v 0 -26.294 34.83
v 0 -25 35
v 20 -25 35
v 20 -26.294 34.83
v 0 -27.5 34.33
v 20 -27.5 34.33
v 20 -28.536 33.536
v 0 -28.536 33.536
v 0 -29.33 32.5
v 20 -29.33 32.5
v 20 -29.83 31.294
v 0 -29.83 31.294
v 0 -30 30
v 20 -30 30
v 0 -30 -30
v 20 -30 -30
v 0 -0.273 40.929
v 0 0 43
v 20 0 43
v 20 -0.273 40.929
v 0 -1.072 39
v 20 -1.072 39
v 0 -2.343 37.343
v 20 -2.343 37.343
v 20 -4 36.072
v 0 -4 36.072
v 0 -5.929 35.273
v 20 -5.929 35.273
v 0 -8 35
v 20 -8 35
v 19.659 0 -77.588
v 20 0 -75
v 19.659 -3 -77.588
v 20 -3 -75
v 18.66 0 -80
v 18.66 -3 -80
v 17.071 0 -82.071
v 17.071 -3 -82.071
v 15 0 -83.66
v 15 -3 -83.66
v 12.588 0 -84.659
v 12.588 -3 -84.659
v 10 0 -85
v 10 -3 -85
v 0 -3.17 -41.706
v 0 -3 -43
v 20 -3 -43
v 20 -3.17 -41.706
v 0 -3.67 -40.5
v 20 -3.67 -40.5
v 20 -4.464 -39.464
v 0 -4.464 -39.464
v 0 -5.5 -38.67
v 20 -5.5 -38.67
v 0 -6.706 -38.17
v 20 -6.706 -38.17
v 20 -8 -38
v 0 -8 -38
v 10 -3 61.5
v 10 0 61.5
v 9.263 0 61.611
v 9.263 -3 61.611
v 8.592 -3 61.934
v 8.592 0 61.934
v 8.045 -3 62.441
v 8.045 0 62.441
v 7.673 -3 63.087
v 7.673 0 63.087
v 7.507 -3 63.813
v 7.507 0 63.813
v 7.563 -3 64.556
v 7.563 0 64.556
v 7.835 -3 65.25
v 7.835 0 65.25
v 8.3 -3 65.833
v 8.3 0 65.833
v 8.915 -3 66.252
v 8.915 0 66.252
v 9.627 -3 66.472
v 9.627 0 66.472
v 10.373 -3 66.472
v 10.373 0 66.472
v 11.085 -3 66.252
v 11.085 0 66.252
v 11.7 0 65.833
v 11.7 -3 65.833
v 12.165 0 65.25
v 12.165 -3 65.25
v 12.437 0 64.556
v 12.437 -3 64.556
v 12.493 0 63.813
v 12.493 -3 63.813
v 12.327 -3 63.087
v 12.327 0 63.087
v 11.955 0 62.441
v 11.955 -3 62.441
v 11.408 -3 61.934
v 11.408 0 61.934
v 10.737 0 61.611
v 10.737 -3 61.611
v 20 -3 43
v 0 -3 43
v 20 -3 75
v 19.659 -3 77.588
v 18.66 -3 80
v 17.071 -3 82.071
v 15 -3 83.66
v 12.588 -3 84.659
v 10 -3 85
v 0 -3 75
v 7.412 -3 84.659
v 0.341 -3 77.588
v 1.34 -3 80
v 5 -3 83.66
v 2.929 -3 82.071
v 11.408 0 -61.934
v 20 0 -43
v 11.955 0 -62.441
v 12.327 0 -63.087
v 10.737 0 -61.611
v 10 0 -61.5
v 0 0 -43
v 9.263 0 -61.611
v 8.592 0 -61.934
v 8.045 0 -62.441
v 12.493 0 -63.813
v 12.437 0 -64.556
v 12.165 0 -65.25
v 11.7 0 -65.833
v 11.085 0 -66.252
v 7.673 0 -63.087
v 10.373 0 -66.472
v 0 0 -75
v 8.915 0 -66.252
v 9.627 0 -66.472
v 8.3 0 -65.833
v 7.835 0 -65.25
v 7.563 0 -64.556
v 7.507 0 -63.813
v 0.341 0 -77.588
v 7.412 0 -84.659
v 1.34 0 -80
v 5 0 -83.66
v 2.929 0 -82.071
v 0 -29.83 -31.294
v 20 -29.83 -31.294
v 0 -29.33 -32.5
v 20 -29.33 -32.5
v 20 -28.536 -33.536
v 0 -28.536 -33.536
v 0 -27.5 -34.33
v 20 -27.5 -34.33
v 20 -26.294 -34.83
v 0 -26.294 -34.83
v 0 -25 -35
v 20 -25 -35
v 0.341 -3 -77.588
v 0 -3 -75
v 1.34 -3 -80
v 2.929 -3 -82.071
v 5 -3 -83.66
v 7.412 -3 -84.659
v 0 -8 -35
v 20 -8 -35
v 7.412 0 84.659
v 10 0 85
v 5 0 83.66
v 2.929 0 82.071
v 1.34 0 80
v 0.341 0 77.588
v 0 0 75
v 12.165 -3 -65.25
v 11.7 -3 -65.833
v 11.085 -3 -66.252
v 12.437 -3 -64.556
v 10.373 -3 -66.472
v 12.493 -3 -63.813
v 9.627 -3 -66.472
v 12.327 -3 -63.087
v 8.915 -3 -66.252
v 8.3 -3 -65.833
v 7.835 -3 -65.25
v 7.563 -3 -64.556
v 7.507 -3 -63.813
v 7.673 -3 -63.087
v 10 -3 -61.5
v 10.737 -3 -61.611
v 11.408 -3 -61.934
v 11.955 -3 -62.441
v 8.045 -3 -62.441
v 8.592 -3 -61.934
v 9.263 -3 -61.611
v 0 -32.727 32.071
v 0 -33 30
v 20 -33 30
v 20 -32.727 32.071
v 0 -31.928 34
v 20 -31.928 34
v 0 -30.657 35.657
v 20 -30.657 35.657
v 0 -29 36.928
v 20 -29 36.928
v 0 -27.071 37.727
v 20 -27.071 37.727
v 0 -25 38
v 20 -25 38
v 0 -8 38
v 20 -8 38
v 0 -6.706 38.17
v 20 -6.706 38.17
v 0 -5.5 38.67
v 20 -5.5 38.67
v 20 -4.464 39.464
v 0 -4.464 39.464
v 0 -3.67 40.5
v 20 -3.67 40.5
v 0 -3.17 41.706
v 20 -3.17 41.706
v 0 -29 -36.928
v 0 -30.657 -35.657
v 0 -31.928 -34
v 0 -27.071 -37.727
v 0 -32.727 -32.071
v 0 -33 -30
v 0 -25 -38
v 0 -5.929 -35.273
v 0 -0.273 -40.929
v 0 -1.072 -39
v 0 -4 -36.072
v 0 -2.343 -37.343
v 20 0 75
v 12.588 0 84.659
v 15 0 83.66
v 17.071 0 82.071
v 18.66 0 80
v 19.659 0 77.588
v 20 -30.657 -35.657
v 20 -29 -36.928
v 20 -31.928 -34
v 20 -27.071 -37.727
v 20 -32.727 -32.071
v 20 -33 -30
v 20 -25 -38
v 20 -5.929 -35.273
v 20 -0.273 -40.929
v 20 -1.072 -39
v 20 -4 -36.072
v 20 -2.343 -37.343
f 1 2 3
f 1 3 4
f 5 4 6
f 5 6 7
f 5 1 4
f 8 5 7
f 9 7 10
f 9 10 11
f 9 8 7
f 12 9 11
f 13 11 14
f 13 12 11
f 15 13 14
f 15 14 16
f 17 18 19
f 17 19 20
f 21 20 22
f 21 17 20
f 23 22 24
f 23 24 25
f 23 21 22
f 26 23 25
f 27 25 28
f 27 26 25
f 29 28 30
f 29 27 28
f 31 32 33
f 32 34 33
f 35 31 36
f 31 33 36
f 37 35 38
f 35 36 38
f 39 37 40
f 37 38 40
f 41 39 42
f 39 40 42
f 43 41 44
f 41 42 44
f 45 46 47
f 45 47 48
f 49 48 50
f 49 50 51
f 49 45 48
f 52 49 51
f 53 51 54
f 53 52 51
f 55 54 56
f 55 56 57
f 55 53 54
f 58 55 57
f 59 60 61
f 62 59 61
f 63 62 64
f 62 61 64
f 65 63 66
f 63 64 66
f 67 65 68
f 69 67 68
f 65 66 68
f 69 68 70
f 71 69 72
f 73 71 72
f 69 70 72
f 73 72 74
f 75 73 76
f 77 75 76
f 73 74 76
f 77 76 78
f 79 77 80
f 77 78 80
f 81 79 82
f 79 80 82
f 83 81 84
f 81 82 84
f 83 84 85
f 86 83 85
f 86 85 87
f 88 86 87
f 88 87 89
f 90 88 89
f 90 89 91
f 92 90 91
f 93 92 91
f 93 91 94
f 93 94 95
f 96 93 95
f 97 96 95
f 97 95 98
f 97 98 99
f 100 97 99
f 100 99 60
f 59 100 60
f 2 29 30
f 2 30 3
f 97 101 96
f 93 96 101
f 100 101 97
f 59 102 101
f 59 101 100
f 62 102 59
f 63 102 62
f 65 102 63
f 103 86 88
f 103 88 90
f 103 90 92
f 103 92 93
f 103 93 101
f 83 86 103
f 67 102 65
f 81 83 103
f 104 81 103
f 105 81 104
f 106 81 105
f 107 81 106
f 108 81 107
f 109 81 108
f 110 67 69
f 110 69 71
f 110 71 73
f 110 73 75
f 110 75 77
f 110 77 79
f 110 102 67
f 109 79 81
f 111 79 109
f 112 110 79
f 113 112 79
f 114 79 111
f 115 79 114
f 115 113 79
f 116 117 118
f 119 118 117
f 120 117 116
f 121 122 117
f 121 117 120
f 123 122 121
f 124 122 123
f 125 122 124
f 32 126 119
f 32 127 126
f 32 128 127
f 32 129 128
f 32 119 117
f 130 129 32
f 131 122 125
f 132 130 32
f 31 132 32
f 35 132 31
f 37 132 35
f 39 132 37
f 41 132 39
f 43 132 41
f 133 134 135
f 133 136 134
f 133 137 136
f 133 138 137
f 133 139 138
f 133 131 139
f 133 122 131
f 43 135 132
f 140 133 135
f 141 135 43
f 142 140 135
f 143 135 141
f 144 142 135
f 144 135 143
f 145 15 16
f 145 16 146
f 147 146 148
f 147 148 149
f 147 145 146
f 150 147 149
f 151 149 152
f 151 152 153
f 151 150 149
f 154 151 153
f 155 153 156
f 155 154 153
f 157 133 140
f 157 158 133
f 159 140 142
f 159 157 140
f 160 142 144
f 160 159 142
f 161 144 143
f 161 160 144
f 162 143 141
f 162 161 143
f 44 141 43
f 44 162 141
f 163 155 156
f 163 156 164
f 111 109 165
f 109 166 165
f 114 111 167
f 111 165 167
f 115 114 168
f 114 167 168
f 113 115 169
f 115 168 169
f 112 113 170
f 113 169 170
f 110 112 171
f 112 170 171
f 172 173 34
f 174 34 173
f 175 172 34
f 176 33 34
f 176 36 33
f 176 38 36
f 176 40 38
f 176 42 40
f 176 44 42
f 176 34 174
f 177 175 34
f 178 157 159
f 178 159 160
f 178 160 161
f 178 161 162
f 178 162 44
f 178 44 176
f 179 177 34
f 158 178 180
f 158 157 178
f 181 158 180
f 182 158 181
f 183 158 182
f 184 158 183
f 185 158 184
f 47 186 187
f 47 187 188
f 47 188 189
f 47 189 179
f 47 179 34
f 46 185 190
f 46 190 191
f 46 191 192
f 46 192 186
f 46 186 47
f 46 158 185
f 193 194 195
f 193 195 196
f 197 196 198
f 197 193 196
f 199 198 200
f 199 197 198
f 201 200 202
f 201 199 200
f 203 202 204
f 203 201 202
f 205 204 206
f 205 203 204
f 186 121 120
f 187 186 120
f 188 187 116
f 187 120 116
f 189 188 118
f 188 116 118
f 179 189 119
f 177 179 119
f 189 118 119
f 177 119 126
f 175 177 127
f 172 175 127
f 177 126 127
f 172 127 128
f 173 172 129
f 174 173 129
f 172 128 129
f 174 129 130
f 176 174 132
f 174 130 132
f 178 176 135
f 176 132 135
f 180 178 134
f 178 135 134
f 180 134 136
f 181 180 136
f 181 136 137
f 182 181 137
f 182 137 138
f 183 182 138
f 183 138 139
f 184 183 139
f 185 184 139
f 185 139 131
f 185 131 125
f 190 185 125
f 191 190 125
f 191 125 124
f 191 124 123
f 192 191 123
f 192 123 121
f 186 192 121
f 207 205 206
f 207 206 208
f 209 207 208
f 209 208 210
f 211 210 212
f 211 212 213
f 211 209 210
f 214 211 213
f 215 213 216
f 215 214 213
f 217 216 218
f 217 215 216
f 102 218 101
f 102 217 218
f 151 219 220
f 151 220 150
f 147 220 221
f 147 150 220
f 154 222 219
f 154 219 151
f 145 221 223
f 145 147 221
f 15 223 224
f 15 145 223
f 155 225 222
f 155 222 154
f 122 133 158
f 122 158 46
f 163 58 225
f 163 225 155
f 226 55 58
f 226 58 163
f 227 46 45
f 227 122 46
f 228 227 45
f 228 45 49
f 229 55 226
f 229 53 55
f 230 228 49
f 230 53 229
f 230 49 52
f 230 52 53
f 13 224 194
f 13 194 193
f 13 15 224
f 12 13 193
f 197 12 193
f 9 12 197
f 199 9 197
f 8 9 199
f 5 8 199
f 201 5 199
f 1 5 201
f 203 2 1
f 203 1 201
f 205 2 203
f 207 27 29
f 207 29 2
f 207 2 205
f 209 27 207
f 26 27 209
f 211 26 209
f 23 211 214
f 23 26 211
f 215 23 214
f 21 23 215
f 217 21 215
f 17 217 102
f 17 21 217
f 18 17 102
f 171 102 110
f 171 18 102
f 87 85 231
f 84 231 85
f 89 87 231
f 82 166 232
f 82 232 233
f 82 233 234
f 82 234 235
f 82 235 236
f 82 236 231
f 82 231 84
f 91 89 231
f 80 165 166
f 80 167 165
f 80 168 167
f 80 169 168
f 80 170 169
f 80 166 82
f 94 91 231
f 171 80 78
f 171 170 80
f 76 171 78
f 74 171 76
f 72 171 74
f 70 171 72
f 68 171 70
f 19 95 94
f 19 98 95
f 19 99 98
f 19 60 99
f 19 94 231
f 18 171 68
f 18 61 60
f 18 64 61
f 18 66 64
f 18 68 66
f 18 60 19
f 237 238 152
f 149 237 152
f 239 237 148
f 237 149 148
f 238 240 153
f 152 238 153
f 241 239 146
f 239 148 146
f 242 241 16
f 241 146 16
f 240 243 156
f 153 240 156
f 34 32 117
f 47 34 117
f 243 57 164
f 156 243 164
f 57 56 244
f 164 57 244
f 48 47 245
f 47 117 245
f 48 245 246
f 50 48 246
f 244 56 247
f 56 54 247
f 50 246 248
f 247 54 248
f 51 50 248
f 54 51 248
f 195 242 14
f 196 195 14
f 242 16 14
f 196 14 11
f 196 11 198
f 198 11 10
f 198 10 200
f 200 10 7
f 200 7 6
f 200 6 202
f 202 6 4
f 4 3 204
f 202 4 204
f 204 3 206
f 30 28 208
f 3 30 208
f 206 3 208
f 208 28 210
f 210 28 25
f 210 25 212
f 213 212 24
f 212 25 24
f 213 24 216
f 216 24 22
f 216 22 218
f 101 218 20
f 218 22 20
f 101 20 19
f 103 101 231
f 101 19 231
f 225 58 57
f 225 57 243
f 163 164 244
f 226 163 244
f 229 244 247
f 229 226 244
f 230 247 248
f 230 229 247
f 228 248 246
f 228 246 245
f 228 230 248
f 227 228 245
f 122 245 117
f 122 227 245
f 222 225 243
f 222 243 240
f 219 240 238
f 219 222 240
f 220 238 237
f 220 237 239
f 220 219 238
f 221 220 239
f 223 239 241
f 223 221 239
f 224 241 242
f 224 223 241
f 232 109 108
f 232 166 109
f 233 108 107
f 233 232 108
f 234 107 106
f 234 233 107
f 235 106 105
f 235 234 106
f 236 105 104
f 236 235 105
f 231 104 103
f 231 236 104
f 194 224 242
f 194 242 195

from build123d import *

# Parameters (mm, degrees)
BASE_FLANGE1_DEPTH = 20
SKETCH6_R          = 2.5
CUT_EXTRUDE1_DEPTH = 10
FILLET1_R          = 10


# Sheet-metal steps are written as plain solids
with BuildPart() as part:
    # Sketch1 → Base-Flange1 (new body)
    with BuildSketch(Plane(origin=(0, 0, 0), x_dir=(0, 0, -1), z_dir=(1, 0, 0))):
        with BuildLine():
            Line((-85, 0), (-43, 0))
            ThreePointArc((-43, 0), (-37.343145751, -2.343145751), (-35, -8))
            Line((-35, -8), (-35, -25))
            ThreePointArc((-35, -25), (-33.535533906, -28.535533906), (-30, -30))
            Line((-30, -30), (30, -30))
            ThreePointArc((30, -30), (33.535533906, -28.535533906), (35, -25))
            Line((35, -25), (35, -8))
            ThreePointArc((35, -8), (37.343145751, -2.343145751), (43, 0))
            Line((43, 0), (85, 0))
            Line((85, 0), (85, -3))
            Line((85, -3), (43, -3))
            ThreePointArc((43, -3), (39.464466094, -4.464466094), (38, -8))
            Line((38, -8), (38, -25))
            ThreePointArc((38, -25), (35.656854249, -30.656854249), (30, -33))
            Line((30, -33), (-30, -33))
            ThreePointArc((-30, -33), (-35.656854249, -30.656854249), (-38, -25))
            Line((-38, -25), (-38, -8))
            ThreePointArc((-38, -8), (-39.464466094, -4.464466094), (-43, -3))
            Line((-43, -3), (-85, -3))
            Line((-85, -3), (-85, 0))
        make_face()
    extrude(amount=BASE_FLANGE1_DEPTH)

    # Sketch6 → Cut-Extrude1 (cut)
    with BuildSketch(Plane(origin=(0, 0, 0), x_dir=(1, 0, 0), z_dir=(0, 1, 0))):
        with Locations(Location((10, 64, 0), (0, 0, 270))):
            Circle(SKETCH6_R)
        with Locations(Location((10, -64, 0), (0, 0, 90))):
            Circle(SKETCH6_R)
    extrude(amount=-CUT_EXTRUDE1_DEPTH, mode=Mode.SUBTRACT)

    # Fillet1
    fillet1_edges = [part.edges().sort_by_distance(p)[0] for p in [
        (20, -1.5, -85),
        (0, -1.5, -85),
        (0, -1.5, 85),
        (20, -1.5, 85),
    ]]
    fillet(fillet1_edges, radius=FILLET1_R - 0.0001)  # a hair under: the kernel refuses the full size


solid = part.part
